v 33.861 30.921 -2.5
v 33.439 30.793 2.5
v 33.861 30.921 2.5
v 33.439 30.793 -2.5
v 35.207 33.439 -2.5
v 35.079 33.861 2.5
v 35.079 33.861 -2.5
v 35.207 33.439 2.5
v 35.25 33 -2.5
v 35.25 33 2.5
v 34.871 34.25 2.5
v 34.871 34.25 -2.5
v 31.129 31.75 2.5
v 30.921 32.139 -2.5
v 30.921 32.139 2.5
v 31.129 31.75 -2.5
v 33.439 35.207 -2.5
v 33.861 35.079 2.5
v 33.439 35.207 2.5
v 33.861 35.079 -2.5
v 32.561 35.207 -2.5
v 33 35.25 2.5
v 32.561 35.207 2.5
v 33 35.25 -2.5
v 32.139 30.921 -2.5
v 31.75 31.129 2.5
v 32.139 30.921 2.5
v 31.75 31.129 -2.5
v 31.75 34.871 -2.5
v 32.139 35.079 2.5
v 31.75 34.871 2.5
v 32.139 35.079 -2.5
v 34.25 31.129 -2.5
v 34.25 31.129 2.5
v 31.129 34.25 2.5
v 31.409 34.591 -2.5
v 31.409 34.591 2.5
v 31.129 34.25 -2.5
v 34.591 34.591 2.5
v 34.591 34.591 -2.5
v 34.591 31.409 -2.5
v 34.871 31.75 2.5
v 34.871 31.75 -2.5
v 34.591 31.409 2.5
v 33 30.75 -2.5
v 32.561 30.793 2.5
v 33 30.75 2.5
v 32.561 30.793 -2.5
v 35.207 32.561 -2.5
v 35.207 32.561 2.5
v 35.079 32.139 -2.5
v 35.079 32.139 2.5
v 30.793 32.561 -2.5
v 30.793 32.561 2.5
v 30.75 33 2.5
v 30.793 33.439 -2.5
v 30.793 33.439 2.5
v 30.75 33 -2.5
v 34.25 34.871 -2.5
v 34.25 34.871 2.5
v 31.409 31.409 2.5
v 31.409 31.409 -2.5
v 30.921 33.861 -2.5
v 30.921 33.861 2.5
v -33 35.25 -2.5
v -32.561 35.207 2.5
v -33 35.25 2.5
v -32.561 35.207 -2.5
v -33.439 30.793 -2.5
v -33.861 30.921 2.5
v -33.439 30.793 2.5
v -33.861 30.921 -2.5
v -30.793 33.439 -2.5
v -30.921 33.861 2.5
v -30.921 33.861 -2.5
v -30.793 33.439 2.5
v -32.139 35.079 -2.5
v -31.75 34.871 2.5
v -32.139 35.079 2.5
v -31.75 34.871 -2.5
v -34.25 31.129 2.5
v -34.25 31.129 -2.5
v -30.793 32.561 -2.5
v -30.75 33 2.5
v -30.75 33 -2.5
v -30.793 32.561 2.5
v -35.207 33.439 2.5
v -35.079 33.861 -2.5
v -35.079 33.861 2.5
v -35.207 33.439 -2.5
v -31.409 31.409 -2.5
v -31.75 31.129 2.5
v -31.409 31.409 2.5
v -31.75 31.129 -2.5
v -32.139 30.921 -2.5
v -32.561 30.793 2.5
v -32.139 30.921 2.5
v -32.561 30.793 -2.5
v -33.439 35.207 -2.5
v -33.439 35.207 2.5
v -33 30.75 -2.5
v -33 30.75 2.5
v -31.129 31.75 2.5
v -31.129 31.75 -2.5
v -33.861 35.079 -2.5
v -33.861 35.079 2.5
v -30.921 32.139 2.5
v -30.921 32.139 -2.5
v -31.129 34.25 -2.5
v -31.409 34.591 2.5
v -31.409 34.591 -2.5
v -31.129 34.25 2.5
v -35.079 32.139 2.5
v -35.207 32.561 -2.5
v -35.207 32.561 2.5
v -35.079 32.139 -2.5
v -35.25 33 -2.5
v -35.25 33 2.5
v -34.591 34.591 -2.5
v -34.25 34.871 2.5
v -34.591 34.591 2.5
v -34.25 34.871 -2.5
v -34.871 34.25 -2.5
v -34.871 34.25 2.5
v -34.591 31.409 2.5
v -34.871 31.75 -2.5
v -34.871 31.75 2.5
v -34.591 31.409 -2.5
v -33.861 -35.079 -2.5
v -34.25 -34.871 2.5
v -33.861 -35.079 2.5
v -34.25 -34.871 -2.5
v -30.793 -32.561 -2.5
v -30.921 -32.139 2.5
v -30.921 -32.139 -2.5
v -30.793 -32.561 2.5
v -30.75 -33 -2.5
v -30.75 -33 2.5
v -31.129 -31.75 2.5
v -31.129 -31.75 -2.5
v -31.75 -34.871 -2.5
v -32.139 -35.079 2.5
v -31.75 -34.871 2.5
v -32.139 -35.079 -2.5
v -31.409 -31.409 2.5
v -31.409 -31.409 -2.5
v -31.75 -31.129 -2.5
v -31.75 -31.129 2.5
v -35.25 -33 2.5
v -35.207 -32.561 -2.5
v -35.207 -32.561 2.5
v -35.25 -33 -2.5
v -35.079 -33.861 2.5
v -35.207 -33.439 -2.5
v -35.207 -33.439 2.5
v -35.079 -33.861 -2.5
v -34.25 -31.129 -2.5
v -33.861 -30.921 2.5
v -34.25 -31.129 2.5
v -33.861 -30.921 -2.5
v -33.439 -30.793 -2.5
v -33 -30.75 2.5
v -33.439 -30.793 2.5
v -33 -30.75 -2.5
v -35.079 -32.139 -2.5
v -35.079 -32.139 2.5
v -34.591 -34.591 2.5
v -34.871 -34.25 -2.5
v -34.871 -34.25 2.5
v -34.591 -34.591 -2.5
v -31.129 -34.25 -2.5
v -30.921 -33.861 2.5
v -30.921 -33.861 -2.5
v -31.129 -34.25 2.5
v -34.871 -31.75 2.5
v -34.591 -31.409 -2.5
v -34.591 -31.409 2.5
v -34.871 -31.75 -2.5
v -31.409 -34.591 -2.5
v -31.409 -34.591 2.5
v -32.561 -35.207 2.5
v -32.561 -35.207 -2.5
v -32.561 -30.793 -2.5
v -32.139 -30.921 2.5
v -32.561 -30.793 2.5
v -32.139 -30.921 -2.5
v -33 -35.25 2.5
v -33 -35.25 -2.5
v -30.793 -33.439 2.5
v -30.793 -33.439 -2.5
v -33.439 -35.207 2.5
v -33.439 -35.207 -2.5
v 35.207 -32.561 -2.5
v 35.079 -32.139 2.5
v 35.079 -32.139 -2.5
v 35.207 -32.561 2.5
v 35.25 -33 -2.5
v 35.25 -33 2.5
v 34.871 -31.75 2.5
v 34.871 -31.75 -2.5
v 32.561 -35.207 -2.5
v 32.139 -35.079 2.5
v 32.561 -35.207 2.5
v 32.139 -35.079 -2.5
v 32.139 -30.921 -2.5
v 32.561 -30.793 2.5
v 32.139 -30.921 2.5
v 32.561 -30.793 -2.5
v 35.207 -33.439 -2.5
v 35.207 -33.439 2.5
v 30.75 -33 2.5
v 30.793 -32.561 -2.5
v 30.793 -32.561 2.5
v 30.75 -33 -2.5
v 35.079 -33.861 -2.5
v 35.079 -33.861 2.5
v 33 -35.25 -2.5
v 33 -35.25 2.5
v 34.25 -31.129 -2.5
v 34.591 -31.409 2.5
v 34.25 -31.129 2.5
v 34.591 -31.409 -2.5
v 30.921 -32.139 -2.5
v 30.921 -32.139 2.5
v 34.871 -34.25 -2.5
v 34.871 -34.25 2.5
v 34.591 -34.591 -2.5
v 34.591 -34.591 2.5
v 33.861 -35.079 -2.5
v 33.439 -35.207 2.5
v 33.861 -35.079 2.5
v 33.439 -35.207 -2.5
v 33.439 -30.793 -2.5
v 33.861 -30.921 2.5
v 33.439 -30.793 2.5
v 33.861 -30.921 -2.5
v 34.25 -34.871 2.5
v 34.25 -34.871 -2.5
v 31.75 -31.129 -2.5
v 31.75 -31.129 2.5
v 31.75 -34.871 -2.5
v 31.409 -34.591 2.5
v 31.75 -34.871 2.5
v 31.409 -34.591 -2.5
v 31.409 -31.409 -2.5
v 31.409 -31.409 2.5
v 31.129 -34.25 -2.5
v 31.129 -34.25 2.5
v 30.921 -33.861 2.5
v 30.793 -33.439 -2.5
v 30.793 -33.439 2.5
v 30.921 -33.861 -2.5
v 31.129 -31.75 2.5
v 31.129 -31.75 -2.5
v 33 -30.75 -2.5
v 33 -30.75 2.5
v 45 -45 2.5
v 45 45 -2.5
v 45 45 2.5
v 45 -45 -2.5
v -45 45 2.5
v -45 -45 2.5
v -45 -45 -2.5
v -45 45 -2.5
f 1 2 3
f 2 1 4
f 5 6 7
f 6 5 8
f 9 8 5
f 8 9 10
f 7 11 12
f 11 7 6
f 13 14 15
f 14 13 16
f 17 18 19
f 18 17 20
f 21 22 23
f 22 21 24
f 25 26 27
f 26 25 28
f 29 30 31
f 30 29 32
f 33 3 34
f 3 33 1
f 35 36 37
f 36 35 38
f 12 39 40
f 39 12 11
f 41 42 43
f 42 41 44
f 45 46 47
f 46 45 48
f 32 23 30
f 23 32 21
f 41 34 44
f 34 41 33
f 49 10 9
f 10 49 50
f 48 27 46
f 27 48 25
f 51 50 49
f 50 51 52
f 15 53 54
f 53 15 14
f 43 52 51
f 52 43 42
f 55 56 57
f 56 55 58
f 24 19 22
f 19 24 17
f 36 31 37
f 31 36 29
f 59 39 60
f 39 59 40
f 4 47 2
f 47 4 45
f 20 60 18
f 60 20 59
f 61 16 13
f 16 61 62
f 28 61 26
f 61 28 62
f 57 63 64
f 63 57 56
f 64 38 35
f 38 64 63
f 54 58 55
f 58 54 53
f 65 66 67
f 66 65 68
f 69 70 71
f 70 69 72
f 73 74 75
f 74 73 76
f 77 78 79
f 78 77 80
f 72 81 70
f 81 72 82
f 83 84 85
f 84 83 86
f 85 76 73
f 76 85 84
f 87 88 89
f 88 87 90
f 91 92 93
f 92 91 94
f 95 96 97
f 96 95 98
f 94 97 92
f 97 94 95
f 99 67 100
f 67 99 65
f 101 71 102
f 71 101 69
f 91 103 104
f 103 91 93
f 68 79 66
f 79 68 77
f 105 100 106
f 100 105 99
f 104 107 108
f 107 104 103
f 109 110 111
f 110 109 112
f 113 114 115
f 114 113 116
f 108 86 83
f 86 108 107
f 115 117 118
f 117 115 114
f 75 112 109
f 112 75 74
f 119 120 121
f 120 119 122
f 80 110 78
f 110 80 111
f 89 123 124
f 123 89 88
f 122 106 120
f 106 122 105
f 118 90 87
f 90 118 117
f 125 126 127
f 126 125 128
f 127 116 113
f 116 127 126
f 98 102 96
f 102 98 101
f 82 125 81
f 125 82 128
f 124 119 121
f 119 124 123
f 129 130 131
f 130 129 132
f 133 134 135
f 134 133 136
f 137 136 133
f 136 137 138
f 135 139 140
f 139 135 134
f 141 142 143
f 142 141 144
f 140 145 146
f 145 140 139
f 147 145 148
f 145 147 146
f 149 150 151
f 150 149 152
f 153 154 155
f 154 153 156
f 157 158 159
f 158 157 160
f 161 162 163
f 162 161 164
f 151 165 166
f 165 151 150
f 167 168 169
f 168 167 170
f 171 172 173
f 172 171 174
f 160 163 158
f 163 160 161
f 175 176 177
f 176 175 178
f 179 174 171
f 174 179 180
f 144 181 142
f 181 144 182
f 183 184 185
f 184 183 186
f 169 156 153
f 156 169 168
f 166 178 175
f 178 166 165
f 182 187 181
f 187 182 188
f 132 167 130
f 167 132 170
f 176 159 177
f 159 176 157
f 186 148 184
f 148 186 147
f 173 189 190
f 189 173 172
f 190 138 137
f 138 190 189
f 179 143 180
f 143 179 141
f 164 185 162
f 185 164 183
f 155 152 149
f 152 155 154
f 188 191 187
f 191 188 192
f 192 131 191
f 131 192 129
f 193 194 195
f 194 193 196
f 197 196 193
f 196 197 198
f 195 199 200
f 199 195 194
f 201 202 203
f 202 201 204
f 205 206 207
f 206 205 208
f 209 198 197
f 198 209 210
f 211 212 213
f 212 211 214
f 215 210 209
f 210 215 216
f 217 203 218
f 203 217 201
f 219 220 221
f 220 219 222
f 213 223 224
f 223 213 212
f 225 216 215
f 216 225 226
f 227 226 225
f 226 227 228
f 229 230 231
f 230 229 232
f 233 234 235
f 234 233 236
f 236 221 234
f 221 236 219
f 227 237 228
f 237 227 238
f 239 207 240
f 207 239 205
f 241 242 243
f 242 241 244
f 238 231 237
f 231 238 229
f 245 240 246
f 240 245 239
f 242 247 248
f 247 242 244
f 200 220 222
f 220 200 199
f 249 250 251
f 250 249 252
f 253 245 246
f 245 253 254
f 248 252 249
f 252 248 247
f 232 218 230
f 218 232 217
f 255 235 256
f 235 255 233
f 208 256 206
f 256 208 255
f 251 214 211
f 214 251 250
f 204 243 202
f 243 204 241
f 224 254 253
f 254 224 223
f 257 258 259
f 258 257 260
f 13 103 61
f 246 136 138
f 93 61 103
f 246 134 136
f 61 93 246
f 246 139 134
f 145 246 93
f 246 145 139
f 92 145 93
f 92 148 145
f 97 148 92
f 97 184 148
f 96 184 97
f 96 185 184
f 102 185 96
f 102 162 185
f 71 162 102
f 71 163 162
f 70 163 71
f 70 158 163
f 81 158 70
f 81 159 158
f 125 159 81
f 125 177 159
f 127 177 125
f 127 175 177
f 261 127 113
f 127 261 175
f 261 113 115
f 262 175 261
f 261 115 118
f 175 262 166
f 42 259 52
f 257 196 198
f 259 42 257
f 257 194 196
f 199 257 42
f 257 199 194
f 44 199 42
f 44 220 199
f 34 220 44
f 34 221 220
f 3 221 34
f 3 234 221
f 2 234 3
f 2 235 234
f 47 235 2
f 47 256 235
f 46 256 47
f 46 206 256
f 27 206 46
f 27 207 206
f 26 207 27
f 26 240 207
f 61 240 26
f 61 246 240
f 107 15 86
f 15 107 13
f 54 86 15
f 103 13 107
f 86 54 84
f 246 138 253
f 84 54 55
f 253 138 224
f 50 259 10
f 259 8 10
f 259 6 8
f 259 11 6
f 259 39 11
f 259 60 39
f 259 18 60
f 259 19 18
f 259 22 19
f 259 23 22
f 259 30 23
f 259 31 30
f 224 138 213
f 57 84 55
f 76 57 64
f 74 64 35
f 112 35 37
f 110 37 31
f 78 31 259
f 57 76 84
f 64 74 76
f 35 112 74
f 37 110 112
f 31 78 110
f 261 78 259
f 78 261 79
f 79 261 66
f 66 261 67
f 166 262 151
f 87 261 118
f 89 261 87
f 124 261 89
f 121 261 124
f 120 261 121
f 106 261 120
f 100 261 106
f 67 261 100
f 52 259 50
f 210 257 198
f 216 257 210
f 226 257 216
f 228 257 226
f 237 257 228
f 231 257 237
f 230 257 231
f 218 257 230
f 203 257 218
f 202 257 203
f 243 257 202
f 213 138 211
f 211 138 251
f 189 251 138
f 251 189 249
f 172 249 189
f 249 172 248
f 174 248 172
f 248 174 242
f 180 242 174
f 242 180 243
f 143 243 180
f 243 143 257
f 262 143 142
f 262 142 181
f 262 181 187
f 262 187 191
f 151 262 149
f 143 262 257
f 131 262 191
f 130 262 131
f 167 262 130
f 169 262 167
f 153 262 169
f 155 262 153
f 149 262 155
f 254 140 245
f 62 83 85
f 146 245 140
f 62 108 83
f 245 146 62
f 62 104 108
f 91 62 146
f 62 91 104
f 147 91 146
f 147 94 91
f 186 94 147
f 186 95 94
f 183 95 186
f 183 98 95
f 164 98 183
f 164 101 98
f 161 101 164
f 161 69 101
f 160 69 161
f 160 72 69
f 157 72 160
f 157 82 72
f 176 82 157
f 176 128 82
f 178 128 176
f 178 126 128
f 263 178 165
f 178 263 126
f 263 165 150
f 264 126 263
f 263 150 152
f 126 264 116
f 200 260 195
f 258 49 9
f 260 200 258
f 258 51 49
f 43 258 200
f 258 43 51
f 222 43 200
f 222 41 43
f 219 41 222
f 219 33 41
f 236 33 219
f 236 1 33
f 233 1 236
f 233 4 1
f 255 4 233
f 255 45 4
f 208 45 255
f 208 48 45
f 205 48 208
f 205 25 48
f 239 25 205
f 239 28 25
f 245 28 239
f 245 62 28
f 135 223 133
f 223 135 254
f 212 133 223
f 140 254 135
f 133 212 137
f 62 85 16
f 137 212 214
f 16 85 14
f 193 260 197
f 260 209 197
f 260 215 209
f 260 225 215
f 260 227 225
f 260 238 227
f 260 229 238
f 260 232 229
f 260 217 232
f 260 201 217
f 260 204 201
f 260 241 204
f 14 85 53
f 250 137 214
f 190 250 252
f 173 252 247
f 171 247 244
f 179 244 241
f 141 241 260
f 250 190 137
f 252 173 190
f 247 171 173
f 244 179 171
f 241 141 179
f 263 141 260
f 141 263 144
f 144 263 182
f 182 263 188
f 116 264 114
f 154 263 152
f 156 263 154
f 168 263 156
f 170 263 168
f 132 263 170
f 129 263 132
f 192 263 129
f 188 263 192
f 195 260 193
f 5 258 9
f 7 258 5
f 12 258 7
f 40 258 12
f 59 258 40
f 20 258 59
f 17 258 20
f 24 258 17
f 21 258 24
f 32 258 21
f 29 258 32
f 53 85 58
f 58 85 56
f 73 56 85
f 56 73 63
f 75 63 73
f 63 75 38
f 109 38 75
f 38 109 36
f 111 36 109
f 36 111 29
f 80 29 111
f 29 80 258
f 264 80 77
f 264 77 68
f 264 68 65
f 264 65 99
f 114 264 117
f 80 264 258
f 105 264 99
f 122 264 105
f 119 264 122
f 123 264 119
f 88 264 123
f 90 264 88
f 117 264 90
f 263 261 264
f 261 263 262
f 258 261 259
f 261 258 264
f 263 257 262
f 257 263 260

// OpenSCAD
$fn = 32;

// ----------------------------------------------------------------------
// Corner plate 90 x 90 x 5
// 4 holes, centres taken from the edge offset
// ----------------------------------------------------------------------

// --- parameters (mm) ---
plate = [90, 90, 5];  // overall size (x, y, z)
holes = 4;            // number of holes the drawing asks for
hole_d = 4.5;         // hole diameter
edge = 12;            // hole centre offset from the plate edge

// --- derived feature positions (mm) ---
corner_x = plate[0] / 2 - edge;  // = 33   corner hole X
corner_y = plate[1] / 2 - edge;  // = 33   corner hole Y
feature_centers = [
  [corner_x, corner_y],
  [-corner_x, corner_y],
  [-corner_x, -corner_y],
  [corner_x, -corner_y]
];   // hole centres the loop below drills

// plate outline, every hole drilled through with the same cutters
difference() {
  cube(plate, center = true);
  for (centre = feature_centers)
    translate([centre[0], centre[1], 0])
      cylinder(d = hole_d, h = plate[2] + 2, center = true);
}
